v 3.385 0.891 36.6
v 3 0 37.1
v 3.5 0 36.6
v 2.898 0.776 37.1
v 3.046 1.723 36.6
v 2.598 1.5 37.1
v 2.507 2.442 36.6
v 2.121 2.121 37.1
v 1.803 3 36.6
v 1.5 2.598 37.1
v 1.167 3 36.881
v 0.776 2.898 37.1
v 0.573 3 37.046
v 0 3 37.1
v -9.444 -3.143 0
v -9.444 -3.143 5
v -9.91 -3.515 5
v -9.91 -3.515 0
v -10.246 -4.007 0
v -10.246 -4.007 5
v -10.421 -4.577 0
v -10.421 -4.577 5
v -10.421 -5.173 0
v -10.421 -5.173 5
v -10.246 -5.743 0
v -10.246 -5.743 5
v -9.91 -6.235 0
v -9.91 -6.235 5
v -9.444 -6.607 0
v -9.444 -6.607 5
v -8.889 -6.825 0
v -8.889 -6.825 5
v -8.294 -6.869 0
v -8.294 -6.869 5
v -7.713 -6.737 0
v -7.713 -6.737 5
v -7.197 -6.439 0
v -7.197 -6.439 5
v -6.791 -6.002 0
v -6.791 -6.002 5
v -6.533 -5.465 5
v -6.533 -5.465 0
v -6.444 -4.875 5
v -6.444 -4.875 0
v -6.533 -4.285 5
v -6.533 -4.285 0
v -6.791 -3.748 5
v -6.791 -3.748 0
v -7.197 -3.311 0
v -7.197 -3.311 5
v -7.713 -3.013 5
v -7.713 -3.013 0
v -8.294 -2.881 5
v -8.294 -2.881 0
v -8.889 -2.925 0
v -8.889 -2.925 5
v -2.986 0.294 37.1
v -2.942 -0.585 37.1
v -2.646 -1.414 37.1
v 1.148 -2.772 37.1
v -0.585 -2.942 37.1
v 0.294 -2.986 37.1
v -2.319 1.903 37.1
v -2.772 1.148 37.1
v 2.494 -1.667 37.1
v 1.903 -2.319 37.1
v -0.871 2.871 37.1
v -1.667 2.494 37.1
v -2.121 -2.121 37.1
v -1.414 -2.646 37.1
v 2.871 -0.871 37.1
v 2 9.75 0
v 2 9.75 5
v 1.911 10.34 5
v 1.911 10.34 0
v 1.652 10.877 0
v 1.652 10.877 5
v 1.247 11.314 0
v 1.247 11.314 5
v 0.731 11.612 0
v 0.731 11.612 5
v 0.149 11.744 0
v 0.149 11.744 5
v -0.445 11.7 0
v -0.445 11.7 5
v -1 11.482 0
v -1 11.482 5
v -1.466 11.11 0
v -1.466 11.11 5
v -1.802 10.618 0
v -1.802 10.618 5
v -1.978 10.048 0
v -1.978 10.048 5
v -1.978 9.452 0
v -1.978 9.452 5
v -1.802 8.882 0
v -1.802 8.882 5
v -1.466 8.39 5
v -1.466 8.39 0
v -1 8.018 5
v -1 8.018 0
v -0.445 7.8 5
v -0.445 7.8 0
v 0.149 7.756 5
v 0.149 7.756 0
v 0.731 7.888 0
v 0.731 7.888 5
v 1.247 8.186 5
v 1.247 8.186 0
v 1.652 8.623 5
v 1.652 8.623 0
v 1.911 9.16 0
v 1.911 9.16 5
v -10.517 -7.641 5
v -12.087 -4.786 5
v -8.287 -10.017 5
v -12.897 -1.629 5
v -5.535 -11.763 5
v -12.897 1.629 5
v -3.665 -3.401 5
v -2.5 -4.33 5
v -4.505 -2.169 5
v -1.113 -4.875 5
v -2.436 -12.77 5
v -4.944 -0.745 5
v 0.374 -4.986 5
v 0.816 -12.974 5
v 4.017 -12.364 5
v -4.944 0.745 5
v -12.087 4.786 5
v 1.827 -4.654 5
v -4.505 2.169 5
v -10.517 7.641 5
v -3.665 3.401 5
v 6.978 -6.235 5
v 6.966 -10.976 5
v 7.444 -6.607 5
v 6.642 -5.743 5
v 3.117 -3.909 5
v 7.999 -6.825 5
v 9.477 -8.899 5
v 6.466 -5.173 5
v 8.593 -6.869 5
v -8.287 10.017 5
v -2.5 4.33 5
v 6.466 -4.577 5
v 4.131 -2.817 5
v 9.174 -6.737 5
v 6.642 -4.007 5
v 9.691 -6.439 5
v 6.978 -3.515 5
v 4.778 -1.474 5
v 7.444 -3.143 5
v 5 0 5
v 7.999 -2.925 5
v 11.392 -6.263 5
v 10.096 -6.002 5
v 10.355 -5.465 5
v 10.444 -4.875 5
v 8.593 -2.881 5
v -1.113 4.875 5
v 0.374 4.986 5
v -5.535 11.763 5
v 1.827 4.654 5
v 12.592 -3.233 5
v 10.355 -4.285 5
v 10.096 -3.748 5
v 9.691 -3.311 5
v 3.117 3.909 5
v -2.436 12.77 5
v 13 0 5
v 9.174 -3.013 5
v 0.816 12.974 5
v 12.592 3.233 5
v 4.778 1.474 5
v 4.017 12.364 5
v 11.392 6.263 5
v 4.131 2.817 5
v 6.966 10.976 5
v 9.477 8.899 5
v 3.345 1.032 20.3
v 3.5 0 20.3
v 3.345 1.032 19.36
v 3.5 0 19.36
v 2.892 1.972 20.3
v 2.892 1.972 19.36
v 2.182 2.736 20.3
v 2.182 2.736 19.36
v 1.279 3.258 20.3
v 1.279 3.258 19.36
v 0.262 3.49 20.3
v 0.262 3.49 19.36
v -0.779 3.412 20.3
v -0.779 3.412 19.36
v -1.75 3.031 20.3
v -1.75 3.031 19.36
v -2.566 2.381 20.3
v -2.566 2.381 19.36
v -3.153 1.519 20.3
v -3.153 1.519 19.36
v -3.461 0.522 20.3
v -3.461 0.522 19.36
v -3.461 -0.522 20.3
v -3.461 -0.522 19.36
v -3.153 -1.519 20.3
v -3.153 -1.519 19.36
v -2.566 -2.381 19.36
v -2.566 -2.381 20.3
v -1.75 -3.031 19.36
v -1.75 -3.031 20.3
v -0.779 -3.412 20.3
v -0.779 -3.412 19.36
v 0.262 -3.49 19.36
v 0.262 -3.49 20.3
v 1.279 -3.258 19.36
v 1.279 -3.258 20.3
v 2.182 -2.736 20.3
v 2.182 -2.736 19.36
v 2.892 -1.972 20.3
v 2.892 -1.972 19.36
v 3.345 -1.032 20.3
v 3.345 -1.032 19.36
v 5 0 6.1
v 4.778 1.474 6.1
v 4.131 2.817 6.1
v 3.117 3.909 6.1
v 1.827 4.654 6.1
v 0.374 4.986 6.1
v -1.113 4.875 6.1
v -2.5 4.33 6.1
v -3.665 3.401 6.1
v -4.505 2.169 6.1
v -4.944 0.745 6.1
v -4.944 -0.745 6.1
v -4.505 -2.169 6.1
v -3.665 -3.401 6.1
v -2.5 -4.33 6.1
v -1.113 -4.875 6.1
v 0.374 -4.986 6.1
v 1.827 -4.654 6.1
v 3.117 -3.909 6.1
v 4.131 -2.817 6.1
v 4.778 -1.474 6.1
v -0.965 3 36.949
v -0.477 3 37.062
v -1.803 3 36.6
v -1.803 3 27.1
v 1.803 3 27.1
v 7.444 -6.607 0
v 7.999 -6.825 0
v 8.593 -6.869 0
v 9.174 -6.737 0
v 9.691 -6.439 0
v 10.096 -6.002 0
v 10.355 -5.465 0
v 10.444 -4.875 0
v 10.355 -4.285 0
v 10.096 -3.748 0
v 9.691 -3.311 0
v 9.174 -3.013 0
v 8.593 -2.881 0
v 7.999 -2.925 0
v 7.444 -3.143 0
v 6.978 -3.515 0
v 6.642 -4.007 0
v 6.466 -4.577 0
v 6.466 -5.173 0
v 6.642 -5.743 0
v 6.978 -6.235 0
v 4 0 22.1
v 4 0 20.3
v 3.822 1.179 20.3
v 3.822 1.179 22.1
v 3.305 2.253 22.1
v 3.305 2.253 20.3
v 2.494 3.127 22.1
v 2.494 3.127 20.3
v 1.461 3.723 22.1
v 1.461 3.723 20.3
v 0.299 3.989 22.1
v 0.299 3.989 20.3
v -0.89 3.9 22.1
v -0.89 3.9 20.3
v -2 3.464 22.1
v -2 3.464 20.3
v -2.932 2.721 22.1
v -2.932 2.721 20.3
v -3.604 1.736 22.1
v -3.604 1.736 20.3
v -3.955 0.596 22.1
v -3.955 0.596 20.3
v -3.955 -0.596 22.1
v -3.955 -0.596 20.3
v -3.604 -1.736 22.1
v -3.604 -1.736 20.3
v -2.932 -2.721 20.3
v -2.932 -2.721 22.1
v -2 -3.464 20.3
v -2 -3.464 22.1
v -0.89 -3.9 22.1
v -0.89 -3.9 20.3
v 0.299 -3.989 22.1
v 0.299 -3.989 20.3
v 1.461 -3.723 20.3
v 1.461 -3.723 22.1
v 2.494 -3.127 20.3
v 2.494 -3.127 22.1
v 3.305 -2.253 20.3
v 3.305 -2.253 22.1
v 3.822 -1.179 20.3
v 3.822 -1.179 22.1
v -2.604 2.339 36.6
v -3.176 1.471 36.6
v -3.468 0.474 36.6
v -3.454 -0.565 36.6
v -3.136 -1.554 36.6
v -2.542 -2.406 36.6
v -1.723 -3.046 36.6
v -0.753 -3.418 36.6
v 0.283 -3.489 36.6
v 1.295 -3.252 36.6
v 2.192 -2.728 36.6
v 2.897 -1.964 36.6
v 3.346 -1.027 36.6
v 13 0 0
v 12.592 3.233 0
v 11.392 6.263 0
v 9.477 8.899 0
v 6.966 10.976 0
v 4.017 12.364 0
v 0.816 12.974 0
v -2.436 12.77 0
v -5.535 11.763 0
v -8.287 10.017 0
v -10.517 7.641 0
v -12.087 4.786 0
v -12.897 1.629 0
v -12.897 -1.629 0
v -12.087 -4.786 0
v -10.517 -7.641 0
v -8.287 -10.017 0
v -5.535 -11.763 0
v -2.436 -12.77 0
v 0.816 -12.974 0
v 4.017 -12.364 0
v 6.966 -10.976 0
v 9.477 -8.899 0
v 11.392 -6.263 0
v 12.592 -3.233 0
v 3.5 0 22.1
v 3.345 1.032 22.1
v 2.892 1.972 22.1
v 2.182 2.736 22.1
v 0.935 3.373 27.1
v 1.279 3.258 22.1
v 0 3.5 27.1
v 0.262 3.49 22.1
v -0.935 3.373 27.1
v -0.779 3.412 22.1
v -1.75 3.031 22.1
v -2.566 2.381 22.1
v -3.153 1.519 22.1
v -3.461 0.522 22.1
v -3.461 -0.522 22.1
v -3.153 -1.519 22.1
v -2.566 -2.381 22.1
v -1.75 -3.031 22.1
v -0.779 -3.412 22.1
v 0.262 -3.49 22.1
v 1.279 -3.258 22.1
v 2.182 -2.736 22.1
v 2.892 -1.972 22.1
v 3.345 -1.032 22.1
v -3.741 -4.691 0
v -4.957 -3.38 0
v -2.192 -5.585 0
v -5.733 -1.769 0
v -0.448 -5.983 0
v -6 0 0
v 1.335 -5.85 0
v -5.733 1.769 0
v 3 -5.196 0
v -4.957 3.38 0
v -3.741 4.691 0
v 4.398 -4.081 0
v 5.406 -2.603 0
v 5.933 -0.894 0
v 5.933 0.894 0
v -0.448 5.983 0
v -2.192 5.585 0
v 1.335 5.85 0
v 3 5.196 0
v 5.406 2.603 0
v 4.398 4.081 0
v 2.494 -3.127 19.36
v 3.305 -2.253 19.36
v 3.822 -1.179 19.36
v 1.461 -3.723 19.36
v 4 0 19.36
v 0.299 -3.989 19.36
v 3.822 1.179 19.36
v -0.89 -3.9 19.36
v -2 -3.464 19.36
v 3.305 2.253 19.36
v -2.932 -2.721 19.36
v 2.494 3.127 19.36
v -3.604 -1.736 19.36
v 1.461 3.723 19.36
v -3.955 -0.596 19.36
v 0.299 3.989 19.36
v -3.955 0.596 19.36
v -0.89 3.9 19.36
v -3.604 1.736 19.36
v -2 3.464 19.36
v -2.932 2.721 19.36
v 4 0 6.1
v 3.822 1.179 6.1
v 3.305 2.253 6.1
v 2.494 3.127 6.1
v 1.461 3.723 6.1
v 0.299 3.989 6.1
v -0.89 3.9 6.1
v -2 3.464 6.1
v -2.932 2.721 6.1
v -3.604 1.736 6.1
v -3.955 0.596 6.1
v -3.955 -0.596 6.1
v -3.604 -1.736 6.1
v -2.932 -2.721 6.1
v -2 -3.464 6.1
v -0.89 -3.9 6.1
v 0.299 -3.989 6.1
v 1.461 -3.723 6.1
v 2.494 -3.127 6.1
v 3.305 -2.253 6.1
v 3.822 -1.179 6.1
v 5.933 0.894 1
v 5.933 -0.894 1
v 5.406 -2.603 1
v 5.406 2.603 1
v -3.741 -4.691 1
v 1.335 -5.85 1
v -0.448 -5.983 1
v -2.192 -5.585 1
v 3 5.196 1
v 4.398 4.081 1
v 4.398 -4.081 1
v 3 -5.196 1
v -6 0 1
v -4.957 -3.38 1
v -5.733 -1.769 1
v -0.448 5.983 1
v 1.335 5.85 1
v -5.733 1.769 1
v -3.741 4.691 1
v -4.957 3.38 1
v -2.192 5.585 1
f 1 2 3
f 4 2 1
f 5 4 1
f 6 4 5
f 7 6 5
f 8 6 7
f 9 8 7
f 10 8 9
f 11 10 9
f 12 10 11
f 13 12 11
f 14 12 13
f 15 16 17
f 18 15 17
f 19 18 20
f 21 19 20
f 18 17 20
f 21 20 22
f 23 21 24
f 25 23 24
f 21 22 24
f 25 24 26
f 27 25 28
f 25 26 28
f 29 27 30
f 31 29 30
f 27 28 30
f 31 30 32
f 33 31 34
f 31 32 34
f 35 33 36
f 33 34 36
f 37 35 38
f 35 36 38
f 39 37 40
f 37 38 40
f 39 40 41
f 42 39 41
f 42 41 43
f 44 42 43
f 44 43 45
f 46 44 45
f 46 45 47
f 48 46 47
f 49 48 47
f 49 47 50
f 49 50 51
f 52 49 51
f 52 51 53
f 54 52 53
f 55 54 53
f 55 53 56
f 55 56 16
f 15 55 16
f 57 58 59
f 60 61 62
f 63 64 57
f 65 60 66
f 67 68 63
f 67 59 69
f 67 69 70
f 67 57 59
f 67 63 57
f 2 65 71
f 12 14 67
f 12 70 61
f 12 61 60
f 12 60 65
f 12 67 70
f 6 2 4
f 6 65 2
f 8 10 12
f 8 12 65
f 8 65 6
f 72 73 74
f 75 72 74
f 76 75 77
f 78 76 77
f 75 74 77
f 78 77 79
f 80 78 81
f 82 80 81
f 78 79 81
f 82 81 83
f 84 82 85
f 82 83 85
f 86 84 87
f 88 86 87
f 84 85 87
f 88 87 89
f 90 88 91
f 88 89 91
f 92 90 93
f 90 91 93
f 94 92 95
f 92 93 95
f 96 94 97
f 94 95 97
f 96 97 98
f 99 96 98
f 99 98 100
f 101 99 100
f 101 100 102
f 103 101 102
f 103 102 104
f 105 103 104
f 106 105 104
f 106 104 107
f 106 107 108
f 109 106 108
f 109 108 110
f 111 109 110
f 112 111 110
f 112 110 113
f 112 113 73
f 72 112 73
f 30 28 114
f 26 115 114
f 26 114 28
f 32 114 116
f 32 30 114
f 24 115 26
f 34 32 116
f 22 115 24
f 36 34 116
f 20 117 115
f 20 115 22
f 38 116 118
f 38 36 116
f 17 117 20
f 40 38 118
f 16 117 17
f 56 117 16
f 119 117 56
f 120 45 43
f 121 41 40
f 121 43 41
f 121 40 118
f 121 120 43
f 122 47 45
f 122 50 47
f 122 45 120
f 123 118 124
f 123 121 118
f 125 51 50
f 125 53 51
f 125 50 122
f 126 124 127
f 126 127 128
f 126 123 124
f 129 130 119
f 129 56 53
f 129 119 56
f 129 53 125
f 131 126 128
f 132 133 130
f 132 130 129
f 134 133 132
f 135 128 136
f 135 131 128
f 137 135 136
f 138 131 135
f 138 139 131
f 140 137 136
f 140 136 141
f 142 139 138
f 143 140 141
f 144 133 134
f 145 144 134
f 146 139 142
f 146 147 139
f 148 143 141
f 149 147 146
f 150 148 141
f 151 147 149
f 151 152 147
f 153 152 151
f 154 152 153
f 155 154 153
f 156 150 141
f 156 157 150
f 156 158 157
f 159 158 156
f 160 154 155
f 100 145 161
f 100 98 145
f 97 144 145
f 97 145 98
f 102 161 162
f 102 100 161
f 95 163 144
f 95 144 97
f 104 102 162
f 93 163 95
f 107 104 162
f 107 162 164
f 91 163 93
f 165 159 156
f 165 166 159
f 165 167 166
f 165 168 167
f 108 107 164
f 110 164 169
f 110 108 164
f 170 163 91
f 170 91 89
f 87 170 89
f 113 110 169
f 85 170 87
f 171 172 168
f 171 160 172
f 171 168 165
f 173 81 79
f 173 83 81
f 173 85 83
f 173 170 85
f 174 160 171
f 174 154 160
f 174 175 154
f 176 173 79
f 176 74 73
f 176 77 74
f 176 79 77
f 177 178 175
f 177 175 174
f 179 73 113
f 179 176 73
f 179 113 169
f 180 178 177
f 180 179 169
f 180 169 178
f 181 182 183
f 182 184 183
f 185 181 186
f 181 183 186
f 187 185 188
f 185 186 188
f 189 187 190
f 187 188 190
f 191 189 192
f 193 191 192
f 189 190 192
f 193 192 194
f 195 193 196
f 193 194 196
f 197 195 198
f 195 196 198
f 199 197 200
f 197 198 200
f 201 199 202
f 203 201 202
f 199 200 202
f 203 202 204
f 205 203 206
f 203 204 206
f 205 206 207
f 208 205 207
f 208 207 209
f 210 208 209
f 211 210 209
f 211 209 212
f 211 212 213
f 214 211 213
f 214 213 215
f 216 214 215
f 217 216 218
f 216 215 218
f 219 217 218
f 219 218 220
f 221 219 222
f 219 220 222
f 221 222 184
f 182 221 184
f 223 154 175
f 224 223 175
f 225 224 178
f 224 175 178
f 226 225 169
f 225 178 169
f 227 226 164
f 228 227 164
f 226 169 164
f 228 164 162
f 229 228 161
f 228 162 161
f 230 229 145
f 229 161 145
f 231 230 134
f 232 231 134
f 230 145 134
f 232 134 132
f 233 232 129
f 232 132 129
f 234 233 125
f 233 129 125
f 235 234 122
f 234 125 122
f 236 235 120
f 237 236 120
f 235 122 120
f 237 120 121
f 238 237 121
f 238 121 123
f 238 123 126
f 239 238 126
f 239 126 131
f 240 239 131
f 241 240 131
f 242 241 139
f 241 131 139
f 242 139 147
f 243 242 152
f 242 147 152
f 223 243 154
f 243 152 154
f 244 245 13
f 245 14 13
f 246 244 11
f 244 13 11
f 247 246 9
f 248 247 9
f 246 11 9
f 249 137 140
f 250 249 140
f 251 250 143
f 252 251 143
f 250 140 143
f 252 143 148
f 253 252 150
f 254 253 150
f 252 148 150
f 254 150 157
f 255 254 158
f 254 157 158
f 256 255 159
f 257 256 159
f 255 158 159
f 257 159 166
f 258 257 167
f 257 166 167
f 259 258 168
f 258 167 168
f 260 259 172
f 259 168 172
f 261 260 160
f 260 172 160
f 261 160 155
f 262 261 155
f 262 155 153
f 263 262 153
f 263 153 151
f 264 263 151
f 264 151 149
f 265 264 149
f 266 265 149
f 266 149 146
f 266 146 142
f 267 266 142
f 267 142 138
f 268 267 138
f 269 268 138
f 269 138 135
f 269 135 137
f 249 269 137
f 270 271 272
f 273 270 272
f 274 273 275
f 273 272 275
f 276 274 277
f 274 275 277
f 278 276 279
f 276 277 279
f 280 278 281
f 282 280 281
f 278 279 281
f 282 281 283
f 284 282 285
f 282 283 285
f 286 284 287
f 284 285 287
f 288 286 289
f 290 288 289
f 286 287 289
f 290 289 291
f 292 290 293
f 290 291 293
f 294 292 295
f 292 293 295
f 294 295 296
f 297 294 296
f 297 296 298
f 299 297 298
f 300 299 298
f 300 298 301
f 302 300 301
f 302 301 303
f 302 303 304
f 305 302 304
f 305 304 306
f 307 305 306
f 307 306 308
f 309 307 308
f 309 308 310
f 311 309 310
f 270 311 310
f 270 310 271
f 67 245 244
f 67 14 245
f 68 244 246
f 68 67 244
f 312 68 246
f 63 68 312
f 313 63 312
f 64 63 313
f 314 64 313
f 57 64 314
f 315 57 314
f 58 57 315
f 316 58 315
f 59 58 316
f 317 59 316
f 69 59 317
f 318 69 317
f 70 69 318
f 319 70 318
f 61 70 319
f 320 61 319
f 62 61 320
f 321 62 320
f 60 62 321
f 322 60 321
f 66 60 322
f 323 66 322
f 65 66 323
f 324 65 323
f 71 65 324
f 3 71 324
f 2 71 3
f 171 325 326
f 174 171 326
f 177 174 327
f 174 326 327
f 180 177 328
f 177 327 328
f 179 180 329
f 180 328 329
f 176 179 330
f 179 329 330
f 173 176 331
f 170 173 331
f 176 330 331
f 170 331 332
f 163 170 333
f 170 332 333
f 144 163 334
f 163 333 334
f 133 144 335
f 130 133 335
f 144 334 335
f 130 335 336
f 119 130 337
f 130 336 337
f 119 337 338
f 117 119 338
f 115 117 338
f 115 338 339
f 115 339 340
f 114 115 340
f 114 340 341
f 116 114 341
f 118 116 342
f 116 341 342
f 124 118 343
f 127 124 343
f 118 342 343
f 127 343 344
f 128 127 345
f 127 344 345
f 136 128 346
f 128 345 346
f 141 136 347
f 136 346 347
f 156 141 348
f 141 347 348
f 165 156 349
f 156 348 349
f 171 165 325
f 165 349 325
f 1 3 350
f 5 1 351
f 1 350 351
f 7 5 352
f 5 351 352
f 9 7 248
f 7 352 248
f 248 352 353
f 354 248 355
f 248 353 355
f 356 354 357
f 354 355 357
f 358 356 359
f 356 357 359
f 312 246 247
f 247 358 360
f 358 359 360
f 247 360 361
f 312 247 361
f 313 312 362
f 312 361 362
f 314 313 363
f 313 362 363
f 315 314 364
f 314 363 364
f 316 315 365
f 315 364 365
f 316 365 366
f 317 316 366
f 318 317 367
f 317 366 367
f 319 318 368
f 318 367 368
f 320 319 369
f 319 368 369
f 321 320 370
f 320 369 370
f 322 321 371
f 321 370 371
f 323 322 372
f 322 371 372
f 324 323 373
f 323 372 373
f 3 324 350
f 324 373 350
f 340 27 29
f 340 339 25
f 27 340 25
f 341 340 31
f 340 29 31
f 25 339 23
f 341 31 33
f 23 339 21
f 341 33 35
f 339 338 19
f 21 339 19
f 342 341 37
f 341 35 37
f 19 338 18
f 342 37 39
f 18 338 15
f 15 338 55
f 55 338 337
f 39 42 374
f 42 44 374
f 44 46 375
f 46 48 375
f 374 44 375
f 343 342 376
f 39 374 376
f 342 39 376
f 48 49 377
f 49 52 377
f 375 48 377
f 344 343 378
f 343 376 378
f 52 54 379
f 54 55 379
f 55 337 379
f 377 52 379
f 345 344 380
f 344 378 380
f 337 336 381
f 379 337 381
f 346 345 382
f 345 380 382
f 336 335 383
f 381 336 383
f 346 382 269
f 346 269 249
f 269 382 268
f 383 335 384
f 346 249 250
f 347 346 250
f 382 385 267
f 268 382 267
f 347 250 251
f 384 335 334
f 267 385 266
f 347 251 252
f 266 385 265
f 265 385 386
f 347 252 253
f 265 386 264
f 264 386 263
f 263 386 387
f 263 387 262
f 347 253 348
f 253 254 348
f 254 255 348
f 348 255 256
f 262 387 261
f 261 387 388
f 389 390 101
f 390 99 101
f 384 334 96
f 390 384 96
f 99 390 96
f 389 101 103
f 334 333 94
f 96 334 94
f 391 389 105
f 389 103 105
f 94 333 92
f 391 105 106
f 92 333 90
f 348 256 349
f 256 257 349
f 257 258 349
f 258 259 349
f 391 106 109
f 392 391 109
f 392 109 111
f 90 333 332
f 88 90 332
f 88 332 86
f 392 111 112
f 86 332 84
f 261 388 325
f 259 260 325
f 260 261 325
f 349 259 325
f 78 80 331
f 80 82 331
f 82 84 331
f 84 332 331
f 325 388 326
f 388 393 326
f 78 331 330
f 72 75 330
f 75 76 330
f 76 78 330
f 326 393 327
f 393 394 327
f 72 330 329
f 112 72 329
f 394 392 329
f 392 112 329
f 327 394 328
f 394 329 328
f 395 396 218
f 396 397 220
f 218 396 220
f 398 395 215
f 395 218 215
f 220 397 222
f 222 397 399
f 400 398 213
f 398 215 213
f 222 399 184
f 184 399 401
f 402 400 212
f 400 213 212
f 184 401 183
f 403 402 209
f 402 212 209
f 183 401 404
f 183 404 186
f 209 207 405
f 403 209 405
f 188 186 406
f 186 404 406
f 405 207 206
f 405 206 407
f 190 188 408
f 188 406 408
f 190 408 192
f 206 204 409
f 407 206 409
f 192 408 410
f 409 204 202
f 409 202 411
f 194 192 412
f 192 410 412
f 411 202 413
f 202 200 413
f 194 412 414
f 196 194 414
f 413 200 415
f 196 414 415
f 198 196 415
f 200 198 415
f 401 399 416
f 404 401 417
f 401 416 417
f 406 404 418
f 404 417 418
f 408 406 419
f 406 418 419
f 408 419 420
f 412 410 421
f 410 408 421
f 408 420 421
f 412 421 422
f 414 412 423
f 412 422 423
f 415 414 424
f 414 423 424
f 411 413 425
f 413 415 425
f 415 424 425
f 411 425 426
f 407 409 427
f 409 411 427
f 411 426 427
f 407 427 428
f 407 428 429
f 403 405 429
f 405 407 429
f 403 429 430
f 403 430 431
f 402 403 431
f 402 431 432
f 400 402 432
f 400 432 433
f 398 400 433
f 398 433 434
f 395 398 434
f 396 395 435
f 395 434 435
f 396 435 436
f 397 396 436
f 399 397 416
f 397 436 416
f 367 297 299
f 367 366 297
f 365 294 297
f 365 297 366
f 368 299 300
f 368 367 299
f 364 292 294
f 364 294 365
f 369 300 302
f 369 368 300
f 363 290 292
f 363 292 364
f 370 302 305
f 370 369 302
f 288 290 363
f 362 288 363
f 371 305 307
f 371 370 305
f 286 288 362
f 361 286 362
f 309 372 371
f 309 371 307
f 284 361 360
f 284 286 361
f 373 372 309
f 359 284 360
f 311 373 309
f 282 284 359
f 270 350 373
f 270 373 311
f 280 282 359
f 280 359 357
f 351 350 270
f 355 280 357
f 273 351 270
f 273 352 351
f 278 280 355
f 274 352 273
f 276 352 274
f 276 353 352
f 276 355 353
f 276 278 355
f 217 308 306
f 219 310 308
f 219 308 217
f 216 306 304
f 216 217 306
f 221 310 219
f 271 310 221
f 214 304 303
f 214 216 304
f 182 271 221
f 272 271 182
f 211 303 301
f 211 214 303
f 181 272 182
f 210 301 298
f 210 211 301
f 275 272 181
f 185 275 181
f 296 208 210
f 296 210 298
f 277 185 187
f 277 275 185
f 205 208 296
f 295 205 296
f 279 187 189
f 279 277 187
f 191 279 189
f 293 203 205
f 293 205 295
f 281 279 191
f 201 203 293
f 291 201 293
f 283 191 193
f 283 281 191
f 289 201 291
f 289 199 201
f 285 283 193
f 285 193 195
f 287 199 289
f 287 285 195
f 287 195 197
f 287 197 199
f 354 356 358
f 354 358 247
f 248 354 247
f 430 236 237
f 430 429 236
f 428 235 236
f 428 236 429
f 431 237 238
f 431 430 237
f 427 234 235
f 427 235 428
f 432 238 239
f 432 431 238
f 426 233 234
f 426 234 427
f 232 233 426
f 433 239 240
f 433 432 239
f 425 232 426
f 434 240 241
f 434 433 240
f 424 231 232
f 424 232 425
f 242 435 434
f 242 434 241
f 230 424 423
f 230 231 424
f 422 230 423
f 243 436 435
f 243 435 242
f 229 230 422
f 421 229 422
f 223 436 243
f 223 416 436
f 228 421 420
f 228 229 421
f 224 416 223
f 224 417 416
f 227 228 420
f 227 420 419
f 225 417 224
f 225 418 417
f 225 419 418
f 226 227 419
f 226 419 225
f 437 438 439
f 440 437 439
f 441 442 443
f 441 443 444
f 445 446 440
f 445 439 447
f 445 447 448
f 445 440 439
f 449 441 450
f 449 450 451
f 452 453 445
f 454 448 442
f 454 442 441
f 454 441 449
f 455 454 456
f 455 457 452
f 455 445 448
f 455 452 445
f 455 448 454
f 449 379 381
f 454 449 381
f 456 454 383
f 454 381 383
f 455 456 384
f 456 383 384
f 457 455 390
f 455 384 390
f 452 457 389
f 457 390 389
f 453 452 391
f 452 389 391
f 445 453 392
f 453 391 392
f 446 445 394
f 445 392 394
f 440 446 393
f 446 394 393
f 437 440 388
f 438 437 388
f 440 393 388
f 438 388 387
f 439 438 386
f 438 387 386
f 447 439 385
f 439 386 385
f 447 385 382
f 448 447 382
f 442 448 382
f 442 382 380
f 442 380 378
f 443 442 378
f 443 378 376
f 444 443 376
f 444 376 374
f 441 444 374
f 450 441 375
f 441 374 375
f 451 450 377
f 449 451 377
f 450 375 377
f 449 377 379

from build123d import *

# Parameters (mm, degrees)
ESQUISSE1_R                  = 13
BASE_EXTRUSION_DEPTH         = 5
ESQUISSE2_R                  = 5
BOSS_EXTRU_1_DEPTH           = 1.1
ESQUISSE3_R                  = 4
BOSS_EXTRU_2_DEPTH           = 16
ESQUISSE4_R                  = 3.5
BOSS_EXTRU_3_DEPTH           = 15
ESQUISSE5_R                  = 2
ENL_V_MAT_EXTRU_1_DEPTH      = 6
R_P_TITION_CIRCULAIRE1_COUNT = 3
ESQUISSE6_W                  = 3.116395494
ESQUISSE6_H                  = 0.94
CHANFREIN1_SIZE              = 0.5
ENL_V_MAT_EXTRU_2_DEPTH      = 10
ESQUISSE9_R                  = 6
ENL_V_MAT_EXTRU_3_DEPTH      = 1


with BuildPart() as part:
    # Esquisse1 → Base-Extrusion (new body)
    with BuildSketch(Plane.XY):
        Circle(ESQUISSE1_R)
    extrude(amount=BASE_EXTRUSION_DEPTH)

    # Esquisse2 → Boss.-Extru.1 (add)
    with BuildSketch(Plane.XY.offset(5)):
        Circle(ESQUISSE2_R)
    extrude(amount=BOSS_EXTRU_1_DEPTH)

    # Esquisse3 → Boss.-Extru.2 (add)
    with BuildSketch(Plane.XY.offset(6.1)):
        Circle(ESQUISSE3_R)
    extrude(amount=BOSS_EXTRU_2_DEPTH)

    # Esquisse4 → Boss.-Extru.3 (add)
    with BuildSketch(Plane.XY.offset(22.1)):
        Circle(ESQUISSE4_R)
    extrude(amount=BOSS_EXTRU_3_DEPTH)

    # Esquisse5 → Enlèv. mat.-Extru.1 (cut, through all)
    with BuildSketch(Plane.XY.offset(5)):
        with Locations((0, 9.75)):
            Circle(ESQUISSE5_R)
    enl_v_mat_extru_1 = extrude(amount=-ENL_V_MAT_EXTRU_1_DEPTH, mode=Mode.SUBTRACT)

    # Répétition circulaire1: Enlèv. mat.-Extru.1 ×3 about axis
    r_p_tition_circulaire1_axis = Axis((0, 0, 0), (0, 0, -1))
    for i in range(1, R_P_TITION_CIRCULAIRE1_COUNT):
        add(enl_v_mat_extru_1.rotate(r_p_tition_circulaire1_axis, i * 360 / R_P_TITION_CIRCULAIRE1_COUNT), mode=Mode.SUBTRACT)

    # Esquisse6 → Enlèvement de matière-Révolution1 (revolve, cut)
    with BuildSketch(Plane(origin=(0, 0, 0), x_dir=(1, 0, 0), z_dir=(0, 1, 0))):
        with Locations((5.058197747, -19.83)):
            Rectangle(ESQUISSE6_W, ESQUISSE6_H)
    revolve(axis=Axis((0, 0, 28.771832847), (0, 0, 1)), mode=Mode.SUBTRACT)

    # Chanfrein1
    chanfrein1_edges = [part.edges().sort_by_distance(p)[0] for p in [
        (-3.5, 0, 37.1),
    ]]
    chamfer(chanfrein1_edges, length=CHANFREIN1_SIZE)

    # Esquisse8 → Enlèv. mat.-Extru.2 (cut)
    with BuildSketch(Plane.XY.offset(37.1)):
        with BuildLine():
            Line((-1.802775638, 3), (1.802775638, 3))
            ThreePointArc((1.802775638, 3), (0, 3.5), (-1.802775638, 3))
        make_face()
    extrude(amount=-ENL_V_MAT_EXTRU_2_DEPTH, mode=Mode.SUBTRACT)

    # Esquisse9 → Enlèv. mat.-Extru.3 (cut)
    with BuildSketch(Plane(origin=(0, 0, 0), x_dir=(-1, 0, 0), z_dir=(0, 0, -1))):
        Circle(ESQUISSE9_R)
    extrude(amount=-ENL_V_MAT_EXTRU_3_DEPTH, mode=Mode.SUBTRACT)


solid = part.part
